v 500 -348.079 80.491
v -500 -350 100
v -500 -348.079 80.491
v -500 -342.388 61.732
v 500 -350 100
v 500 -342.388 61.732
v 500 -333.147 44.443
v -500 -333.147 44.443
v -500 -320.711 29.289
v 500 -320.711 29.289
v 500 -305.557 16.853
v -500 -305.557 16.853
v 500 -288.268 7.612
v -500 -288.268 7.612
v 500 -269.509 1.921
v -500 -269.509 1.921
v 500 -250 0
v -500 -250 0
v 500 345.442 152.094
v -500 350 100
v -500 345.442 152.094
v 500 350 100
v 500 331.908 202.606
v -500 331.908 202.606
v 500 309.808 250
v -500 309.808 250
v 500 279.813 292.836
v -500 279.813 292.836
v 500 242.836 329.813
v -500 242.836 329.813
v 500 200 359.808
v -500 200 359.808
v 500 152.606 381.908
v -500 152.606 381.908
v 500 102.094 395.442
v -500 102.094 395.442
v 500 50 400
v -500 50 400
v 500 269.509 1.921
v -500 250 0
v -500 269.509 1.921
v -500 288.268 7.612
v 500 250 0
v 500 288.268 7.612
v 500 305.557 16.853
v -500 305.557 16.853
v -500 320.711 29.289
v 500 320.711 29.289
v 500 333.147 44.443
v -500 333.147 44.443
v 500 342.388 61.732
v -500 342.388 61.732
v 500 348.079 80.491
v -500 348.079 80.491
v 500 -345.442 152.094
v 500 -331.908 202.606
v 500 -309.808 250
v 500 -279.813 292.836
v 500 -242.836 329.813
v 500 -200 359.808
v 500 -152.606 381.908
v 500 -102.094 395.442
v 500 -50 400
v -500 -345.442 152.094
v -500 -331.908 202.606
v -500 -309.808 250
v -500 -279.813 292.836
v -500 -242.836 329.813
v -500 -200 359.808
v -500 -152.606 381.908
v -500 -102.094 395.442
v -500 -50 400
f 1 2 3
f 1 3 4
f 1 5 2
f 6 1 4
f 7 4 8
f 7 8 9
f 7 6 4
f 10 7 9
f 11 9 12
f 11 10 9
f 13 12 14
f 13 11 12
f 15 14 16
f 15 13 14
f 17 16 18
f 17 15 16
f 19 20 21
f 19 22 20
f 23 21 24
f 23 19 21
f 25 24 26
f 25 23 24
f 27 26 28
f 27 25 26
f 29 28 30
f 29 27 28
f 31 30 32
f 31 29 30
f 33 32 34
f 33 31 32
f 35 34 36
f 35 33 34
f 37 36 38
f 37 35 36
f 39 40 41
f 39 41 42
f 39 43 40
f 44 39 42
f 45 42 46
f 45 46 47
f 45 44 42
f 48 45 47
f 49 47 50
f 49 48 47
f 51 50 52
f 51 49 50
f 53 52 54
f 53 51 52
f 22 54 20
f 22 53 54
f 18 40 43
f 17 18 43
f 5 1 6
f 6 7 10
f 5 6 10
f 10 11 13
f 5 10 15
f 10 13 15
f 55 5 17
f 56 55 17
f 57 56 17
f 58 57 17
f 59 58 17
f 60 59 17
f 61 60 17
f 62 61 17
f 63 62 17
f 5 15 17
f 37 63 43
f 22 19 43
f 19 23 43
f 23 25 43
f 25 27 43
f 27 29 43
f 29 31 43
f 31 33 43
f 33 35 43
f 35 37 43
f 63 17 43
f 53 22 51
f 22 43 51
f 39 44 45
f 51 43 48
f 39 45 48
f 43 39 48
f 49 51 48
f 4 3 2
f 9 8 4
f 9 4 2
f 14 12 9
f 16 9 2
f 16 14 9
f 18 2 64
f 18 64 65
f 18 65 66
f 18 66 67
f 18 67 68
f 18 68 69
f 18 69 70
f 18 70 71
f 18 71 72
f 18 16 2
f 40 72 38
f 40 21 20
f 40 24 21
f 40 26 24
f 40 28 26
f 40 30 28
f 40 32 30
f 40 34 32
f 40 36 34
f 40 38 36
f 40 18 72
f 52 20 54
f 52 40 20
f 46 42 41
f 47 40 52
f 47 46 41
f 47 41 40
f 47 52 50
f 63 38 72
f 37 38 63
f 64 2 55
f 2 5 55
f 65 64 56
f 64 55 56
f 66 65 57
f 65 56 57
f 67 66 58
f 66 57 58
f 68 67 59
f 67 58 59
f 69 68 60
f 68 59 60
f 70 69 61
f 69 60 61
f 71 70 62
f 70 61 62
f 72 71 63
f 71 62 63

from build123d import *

# Parameters (mm, degrees)
F0_W     = 1000
F0_H     = 700
F1_DEPTH = 400
F2_R     = 300
F3_R     = 99.99999


# Not quite as in the source:
# - a fillet or chamfer is up to 0.001 mm smaller than in the source, because OpenCascade refuses the exact size


with BuildPart() as f1:
    # F0 (on Top) → F1 (new body)
    with BuildSketch(Plane.XY):
        Rectangle(F0_W, F0_H)
    extrude(amount=F1_DEPTH)

    # F2
    f2_edges = [f1.edges().sort_by_distance(p)[0] for p in [
        (0, -350, 400),
        (0, 350, 400),
    ]]
    fillet(f2_edges, radius=F2_R)

    # F3 (radius 100 in the source; OpenCascade refuses exactly that, so slightly less here)
    f3_edges = [f1.edges().sort_by_distance(p)[0] for p in [
        (0, 350, 0),
        (0, -350, 0),
    ]]
    fillet(f3_edges, radius=F3_R)


solid = f1.part
